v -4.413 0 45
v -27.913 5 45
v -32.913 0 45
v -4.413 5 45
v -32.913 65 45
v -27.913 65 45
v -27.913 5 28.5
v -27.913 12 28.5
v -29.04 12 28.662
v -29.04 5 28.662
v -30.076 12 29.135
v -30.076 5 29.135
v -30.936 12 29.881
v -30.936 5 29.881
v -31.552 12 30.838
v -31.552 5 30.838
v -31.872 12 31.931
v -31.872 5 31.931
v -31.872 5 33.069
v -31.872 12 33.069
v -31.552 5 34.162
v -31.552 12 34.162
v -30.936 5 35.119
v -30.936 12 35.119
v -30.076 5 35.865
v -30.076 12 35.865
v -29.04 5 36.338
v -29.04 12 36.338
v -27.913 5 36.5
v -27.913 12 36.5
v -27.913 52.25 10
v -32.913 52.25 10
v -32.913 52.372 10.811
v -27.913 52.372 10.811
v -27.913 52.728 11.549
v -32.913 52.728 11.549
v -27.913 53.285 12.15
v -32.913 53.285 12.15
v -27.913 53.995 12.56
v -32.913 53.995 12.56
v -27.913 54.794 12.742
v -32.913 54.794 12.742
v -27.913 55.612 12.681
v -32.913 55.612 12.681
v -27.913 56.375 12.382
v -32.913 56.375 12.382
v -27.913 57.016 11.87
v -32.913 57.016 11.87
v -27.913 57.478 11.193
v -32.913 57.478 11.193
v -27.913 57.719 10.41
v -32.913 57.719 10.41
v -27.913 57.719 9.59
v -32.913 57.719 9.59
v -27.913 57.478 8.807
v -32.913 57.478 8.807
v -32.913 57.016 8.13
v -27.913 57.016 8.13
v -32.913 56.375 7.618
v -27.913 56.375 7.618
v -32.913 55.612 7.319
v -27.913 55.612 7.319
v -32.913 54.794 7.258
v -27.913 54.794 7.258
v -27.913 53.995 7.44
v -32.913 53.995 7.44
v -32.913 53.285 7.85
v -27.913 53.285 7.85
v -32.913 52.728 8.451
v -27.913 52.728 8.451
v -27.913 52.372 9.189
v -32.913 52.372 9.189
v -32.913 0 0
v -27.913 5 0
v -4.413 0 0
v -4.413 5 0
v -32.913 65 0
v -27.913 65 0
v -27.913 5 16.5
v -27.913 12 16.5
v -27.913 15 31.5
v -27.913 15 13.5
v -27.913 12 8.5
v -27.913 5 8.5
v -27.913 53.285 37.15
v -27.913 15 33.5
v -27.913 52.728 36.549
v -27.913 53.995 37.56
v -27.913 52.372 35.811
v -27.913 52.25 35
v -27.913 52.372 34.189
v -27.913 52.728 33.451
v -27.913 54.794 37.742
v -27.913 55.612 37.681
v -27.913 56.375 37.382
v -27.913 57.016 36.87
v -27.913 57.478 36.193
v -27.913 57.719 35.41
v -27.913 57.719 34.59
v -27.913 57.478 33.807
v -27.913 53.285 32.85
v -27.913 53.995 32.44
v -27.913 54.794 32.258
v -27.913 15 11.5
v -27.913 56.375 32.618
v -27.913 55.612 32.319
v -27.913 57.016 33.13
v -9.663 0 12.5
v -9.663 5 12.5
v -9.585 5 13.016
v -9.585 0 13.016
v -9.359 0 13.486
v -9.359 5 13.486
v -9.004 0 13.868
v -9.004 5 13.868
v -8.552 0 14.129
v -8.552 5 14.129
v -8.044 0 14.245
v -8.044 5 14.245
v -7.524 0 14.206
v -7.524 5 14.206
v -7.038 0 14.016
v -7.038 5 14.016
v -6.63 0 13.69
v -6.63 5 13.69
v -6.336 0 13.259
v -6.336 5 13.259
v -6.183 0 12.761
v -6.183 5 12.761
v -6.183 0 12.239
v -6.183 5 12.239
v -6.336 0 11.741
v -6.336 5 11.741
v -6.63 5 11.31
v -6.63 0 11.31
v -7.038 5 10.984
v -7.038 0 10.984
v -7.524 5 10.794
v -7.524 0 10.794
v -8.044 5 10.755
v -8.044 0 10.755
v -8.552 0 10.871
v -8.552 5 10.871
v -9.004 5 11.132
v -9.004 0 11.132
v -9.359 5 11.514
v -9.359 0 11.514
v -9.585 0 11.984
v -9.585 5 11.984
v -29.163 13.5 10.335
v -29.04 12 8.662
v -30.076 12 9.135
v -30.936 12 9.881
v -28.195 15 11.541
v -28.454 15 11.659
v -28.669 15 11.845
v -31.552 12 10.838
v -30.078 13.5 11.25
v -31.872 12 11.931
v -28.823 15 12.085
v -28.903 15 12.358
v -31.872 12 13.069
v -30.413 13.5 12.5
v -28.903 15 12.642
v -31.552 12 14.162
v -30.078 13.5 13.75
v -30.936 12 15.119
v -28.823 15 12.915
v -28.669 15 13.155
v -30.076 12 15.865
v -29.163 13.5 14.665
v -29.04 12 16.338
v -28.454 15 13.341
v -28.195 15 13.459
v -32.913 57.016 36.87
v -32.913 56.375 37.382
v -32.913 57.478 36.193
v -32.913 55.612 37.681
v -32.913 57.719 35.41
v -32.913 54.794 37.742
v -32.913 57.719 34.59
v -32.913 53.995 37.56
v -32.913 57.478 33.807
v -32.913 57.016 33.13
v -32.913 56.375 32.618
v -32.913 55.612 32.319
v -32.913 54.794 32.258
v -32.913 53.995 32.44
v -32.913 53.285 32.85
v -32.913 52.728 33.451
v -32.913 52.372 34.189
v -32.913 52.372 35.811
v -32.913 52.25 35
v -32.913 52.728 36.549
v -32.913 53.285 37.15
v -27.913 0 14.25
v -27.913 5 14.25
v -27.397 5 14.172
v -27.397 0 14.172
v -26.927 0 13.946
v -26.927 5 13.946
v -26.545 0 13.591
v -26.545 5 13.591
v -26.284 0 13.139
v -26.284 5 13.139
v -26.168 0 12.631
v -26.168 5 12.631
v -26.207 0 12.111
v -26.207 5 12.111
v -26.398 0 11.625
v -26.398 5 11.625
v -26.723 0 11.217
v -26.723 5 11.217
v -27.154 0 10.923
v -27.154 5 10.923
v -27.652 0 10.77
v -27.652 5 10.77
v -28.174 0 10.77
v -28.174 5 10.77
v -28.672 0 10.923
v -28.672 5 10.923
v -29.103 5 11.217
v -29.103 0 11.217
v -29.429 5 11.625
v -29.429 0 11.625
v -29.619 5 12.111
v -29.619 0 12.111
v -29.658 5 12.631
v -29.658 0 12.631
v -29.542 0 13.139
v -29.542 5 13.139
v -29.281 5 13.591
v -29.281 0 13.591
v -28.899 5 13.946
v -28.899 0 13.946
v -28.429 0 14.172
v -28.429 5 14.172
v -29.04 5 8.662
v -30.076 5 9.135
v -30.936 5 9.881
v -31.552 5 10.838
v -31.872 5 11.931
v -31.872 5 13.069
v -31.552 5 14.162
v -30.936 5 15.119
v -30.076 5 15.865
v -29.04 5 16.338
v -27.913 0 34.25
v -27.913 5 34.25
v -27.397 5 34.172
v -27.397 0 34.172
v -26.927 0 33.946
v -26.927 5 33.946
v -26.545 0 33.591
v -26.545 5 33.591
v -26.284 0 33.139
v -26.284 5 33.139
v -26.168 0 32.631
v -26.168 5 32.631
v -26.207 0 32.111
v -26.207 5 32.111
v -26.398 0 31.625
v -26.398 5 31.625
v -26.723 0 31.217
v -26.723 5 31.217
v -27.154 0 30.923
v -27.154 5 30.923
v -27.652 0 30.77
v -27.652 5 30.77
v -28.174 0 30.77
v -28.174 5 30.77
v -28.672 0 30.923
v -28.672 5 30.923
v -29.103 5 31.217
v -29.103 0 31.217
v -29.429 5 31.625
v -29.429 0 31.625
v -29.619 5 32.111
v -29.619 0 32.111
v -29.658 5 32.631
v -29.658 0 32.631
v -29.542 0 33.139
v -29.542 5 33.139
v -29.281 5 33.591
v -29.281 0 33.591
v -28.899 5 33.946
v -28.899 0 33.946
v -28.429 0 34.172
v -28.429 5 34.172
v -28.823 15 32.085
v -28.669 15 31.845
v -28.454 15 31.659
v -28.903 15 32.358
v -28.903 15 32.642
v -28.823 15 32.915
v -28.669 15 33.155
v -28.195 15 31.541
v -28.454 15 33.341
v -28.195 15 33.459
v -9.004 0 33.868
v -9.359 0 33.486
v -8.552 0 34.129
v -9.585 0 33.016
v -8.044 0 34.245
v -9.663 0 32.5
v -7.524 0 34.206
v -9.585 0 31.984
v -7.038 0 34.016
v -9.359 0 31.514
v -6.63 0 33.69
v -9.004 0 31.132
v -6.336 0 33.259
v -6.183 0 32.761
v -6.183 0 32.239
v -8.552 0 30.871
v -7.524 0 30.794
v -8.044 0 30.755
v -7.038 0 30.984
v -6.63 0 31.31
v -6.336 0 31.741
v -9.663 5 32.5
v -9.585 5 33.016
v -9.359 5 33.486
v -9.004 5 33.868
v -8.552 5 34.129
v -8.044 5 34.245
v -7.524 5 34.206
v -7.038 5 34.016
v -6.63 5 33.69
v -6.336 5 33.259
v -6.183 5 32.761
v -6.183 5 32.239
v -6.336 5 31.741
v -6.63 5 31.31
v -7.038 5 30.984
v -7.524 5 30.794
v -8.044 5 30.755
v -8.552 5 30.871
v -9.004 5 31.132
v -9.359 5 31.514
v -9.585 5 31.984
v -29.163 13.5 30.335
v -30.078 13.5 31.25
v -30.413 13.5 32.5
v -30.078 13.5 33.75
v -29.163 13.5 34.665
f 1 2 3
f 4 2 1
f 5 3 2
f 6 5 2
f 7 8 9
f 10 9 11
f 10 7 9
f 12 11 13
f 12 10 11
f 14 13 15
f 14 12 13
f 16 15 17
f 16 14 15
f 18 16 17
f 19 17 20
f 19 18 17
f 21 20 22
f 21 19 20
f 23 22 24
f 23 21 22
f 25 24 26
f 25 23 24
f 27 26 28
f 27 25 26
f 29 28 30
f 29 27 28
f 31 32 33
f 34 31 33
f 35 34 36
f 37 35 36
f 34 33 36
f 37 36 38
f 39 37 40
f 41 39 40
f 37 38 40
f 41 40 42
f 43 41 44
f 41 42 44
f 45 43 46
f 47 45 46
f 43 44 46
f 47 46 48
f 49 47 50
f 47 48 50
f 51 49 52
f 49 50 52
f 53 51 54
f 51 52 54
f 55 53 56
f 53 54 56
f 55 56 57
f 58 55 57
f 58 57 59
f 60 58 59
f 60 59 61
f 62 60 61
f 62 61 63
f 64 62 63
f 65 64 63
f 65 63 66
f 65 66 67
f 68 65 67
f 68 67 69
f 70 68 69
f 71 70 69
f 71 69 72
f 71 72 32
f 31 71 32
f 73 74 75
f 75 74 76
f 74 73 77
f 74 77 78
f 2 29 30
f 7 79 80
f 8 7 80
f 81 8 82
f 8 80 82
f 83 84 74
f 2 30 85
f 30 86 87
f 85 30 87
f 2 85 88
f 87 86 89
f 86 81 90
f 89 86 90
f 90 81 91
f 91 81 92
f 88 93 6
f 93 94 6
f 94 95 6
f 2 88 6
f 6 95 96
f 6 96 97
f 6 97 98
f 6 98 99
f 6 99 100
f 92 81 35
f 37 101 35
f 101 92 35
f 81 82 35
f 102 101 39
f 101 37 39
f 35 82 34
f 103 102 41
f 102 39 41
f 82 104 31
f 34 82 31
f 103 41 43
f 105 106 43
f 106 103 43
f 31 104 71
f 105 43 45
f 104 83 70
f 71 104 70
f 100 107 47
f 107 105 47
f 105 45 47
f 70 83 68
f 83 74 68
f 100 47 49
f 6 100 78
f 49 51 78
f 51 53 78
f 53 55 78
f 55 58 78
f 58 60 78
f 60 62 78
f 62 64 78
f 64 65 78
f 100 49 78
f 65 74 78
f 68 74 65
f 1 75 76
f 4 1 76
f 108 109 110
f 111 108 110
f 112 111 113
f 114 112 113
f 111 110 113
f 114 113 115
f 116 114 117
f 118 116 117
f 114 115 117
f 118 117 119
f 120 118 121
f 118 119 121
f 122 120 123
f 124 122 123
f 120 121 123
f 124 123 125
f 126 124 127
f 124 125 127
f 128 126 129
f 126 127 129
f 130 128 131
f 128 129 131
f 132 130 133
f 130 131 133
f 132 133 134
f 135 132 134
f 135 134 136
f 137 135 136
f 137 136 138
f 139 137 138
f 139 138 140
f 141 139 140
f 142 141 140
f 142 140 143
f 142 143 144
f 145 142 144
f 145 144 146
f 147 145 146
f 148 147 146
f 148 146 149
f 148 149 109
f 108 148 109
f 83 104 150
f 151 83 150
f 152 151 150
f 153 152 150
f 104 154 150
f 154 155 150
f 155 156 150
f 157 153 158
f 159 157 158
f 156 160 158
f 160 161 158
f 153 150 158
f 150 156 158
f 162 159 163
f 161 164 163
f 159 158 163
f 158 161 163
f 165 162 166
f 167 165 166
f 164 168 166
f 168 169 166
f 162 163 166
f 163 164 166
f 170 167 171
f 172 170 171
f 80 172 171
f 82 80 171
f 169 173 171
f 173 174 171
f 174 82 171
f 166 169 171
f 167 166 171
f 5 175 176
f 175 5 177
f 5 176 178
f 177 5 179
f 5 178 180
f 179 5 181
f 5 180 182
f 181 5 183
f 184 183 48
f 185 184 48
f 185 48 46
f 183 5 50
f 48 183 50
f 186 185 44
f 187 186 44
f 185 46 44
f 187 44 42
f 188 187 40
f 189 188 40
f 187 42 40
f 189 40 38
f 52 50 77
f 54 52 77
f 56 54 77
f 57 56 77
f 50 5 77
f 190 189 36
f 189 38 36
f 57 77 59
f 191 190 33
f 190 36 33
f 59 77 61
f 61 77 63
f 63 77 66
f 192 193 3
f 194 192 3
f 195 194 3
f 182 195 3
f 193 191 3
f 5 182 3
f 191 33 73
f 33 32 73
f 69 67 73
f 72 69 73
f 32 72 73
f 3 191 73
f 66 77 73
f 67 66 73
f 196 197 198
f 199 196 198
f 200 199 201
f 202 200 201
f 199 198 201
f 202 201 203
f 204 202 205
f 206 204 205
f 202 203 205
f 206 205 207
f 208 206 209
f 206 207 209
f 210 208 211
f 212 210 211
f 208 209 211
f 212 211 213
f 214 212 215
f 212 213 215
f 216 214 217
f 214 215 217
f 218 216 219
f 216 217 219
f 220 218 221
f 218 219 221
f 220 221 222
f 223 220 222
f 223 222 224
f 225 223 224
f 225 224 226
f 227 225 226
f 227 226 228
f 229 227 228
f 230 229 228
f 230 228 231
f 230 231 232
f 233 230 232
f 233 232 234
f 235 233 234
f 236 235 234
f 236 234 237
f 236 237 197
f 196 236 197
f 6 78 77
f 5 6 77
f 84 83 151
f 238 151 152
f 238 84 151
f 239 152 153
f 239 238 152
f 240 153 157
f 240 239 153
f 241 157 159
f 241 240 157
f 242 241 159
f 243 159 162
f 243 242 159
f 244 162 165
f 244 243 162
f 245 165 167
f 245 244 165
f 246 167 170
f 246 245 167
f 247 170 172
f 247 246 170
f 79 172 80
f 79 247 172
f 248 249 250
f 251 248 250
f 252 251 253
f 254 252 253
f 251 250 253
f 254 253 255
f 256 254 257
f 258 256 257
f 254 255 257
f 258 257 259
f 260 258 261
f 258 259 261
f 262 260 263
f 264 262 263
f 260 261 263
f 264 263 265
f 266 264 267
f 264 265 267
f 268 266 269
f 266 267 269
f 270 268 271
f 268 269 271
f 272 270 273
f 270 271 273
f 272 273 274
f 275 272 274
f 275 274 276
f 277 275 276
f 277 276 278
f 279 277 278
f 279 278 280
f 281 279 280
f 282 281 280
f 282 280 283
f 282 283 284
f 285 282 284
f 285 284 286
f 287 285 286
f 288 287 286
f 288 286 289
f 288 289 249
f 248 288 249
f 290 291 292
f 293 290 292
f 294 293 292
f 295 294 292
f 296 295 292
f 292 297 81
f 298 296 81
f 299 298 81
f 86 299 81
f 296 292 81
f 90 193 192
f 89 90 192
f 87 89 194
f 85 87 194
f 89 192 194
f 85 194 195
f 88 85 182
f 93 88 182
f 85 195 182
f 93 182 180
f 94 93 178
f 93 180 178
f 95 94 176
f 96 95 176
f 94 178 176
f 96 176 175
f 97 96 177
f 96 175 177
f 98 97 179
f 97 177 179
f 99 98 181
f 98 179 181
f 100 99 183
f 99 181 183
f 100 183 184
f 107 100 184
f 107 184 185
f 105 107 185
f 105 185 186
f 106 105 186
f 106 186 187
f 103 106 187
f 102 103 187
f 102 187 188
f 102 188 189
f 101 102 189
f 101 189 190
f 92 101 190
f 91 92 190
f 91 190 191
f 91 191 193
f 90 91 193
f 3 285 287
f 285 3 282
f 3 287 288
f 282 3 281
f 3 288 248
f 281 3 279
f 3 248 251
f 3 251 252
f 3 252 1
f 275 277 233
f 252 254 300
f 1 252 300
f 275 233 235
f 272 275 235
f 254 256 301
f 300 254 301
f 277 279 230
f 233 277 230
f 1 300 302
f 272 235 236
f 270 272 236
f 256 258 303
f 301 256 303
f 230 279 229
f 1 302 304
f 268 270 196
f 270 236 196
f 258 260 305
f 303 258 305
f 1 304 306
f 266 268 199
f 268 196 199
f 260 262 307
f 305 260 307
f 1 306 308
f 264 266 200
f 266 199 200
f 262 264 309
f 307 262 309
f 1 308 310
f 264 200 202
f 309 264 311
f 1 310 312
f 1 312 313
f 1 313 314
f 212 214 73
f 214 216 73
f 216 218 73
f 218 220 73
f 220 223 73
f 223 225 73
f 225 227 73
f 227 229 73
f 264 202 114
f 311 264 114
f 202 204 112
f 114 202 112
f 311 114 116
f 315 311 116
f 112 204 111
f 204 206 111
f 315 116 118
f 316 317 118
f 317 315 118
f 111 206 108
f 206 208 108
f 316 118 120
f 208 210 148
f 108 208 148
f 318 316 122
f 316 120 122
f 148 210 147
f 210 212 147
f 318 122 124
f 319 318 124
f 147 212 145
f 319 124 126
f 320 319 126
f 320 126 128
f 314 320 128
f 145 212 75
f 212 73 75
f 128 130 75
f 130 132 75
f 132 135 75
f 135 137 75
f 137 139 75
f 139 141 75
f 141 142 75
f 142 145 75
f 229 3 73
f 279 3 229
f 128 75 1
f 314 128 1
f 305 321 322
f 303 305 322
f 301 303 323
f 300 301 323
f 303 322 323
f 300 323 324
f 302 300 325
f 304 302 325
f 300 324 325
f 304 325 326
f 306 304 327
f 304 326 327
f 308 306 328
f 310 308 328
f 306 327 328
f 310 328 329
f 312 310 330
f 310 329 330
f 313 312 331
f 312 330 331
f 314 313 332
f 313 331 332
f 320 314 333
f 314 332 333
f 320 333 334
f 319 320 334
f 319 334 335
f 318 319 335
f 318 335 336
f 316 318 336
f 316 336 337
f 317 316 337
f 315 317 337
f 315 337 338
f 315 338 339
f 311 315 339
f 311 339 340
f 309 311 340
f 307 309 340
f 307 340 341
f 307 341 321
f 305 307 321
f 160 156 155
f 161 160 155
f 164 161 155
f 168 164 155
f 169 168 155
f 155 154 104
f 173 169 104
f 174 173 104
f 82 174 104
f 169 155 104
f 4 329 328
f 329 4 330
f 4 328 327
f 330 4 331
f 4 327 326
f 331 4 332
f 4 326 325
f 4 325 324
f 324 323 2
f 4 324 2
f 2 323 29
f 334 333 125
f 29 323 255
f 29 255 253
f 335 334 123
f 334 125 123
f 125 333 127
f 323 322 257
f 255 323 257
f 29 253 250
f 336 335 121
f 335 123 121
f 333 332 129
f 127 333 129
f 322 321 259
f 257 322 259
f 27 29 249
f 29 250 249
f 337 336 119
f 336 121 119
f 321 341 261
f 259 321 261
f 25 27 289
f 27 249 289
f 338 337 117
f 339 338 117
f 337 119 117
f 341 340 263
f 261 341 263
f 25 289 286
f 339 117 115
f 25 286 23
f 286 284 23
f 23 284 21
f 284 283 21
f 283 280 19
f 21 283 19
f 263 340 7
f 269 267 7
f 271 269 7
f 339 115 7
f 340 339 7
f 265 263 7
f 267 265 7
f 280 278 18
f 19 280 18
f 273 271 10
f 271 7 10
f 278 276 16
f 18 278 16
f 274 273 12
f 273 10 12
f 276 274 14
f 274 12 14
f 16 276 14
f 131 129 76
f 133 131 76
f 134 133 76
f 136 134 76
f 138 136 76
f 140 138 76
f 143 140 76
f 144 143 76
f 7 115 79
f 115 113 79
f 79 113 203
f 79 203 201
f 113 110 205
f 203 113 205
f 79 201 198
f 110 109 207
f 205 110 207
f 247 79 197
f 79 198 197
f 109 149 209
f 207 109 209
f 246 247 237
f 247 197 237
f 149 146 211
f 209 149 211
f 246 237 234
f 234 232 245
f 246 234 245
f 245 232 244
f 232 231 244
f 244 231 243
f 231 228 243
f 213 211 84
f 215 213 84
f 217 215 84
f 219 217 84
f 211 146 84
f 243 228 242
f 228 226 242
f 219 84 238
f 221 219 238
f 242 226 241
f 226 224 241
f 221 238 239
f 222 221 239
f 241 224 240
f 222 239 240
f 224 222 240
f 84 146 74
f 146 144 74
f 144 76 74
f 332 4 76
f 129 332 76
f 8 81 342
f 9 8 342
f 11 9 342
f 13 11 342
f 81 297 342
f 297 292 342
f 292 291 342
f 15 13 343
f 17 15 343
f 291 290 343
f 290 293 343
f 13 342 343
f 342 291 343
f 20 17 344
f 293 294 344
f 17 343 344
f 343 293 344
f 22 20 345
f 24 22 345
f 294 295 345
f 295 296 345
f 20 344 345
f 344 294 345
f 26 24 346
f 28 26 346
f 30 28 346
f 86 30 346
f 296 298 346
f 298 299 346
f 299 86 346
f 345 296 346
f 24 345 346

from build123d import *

# Parameters (mm, degrees)
BOSS_EXTRU_1_DEPTH      = 45
ENL_V_MAT_EXTRU_1_REACH = 83.904
ESQUISSE2_R             = 1.75
ENL_V_MAT_EXTRU_2_REACH = 86.037
ESQUISSE3_R             = 2.75
ESQUISSE4_R             = 4
ENL_V_MAT_EXTRU_3_DEPTH = 10
CHANFREIN1_SIZE         = 3


with BuildPart() as part:
    # Esquisse1 → Boss.-Extru.1 (new body)
    with BuildSketch(Plane.XY):
        Polygon((-32.913141208, 0), (-4.413141208, 0), (-4.413141208, 5), (-27.913141208, 5), (-27.913141208, 65), (-32.913141208, 65), align=None)
    extrude(amount=BOSS_EXTRU_1_DEPTH)

    # Esquisse2 → Enlèv. mat.-Extru.1 (cut, up to next)
    with BuildSketch(Plane(origin=(0, 5, 0), x_dir=(1, 0, 0), z_dir=(0, 1, 0)), mode=Mode.PRIVATE) as enl_v_mat_extru_1_sk1:
        with Locations(Location((-27.913141208, -32.5, 0), (0, 0, 270))):
            Circle(ESQUISSE2_R)
    enl_v_mat_extru_1_tool1 = extrude(enl_v_mat_extru_1_sk1.sketch, amount=-ENL_V_MAT_EXTRU_1_REACH, mode=Mode.PRIVATE) & part.part
    # Esquisse2 → Enlèv. mat.-Extru.1 (cut, up to next)
    with BuildSketch(Plane(origin=(0, 5, 0), x_dir=(1, 0, 0), z_dir=(0, 1, 0)), mode=Mode.PRIVATE) as enl_v_mat_extru_1_sk2:
        with Locations(Location((-27.913141208, -12.5, 0), (0, 0, 270))):
            Circle(ESQUISSE2_R)
    enl_v_mat_extru_1_tool2 = extrude(enl_v_mat_extru_1_sk2.sketch, amount=-ENL_V_MAT_EXTRU_1_REACH, mode=Mode.PRIVATE) & part.part
    # Esquisse2 → Enlèv. mat.-Extru.1 (cut, up to next)
    with BuildSketch(Plane(origin=(0, 5, 0), x_dir=(1, 0, 0), z_dir=(0, 1, 0)), mode=Mode.PRIVATE) as enl_v_mat_extru_1_sk3:
        with Locations(Location((-7.913141208, -12.5, 0), (0, 0, 180))):
            Circle(ESQUISSE2_R)
    enl_v_mat_extru_1_tool3 = extrude(enl_v_mat_extru_1_sk3.sketch, amount=-ENL_V_MAT_EXTRU_1_REACH, mode=Mode.PRIVATE) & part.part
    # Esquisse2 → Enlèv. mat.-Extru.1 (cut, up to next)
    with BuildSketch(Plane(origin=(0, 5, 0), x_dir=(1, 0, 0), z_dir=(0, 1, 0)), mode=Mode.PRIVATE) as enl_v_mat_extru_1_sk4:
        with Locations(Location((-7.913141208, -32.5, 0), (0, 0, 180))):
            Circle(ESQUISSE2_R)
    enl_v_mat_extru_1_tool4 = extrude(enl_v_mat_extru_1_sk4.sketch, amount=-ENL_V_MAT_EXTRU_1_REACH, mode=Mode.PRIVATE) & part.part
    add(enl_v_mat_extru_1_tool1.solids().sort_by_distance((-27.913141, 5, 32.5))[0], mode=Mode.SUBTRACT)
    add(enl_v_mat_extru_1_tool2.solids().sort_by_distance((-27.913141, 5, 12.5))[0], mode=Mode.SUBTRACT)
    add(enl_v_mat_extru_1_tool3.solids().sort_by_distance((-7.913141, 5, 12.5))[0], mode=Mode.SUBTRACT)
    add(enl_v_mat_extru_1_tool4.solids().sort_by_distance((-7.913141, 5, 32.5))[0], mode=Mode.SUBTRACT)

    # Esquisse3 → Enlèv. mat.-Extru.2 (cut, up to next)
    with BuildSketch(Plane.ZY.offset(32.913141208), mode=Mode.PRIVATE) as enl_v_mat_extru_2_sk1:
        with Locations(Location((10, 55, 0), (0, 0, 270))):
            Circle(ESQUISSE3_R)
    enl_v_mat_extru_2_tool1 = extrude(enl_v_mat_extru_2_sk1.sketch, amount=-ENL_V_MAT_EXTRU_2_REACH, mode=Mode.PRIVATE) & part.part
    # Esquisse3 → Enlèv. mat.-Extru.2 (cut, up to next)
    with BuildSketch(Plane.ZY.offset(32.913141208), mode=Mode.PRIVATE) as enl_v_mat_extru_2_sk2:
        with Locations(Location((35, 55, 0), (0, 0, 270))):
            Circle(ESQUISSE3_R)
    enl_v_mat_extru_2_tool2 = extrude(enl_v_mat_extru_2_sk2.sketch, amount=-ENL_V_MAT_EXTRU_2_REACH, mode=Mode.PRIVATE) & part.part
    add(enl_v_mat_extru_2_tool1.solids().sort_by_distance((-32.913141, 55, 10))[0], mode=Mode.SUBTRACT)
    add(enl_v_mat_extru_2_tool2.solids().sort_by_distance((-32.913141, 55, 35))[0], mode=Mode.SUBTRACT)

    # Esquisse4 → Enlèv. mat.-Extru.3 (cut)
    with BuildSketch(Plane(origin=(0, 5, 0), x_dir=(1, 0, 0), z_dir=(0, 1, 0))):
        with Locations((-27.913141208, -32.5)):
            Circle(ESQUISSE4_R)
        with Locations((-27.913141208, -12.5)):
            Circle(ESQUISSE4_R)
    extrude(amount=ENL_V_MAT_EXTRU_3_DEPTH, mode=Mode.SUBTRACT)

    # Chanfrein1
    chanfrein1_edges = [part.edges().sort_by_distance(p)[0] for p in [
        (-31.913141208, 15, 32.5),
        (-31.913141208, 15, 12.5),
    ]]
    chamfer(chanfrein1_edges, length=CHANFREIN1_SIZE)


solid = part.part
